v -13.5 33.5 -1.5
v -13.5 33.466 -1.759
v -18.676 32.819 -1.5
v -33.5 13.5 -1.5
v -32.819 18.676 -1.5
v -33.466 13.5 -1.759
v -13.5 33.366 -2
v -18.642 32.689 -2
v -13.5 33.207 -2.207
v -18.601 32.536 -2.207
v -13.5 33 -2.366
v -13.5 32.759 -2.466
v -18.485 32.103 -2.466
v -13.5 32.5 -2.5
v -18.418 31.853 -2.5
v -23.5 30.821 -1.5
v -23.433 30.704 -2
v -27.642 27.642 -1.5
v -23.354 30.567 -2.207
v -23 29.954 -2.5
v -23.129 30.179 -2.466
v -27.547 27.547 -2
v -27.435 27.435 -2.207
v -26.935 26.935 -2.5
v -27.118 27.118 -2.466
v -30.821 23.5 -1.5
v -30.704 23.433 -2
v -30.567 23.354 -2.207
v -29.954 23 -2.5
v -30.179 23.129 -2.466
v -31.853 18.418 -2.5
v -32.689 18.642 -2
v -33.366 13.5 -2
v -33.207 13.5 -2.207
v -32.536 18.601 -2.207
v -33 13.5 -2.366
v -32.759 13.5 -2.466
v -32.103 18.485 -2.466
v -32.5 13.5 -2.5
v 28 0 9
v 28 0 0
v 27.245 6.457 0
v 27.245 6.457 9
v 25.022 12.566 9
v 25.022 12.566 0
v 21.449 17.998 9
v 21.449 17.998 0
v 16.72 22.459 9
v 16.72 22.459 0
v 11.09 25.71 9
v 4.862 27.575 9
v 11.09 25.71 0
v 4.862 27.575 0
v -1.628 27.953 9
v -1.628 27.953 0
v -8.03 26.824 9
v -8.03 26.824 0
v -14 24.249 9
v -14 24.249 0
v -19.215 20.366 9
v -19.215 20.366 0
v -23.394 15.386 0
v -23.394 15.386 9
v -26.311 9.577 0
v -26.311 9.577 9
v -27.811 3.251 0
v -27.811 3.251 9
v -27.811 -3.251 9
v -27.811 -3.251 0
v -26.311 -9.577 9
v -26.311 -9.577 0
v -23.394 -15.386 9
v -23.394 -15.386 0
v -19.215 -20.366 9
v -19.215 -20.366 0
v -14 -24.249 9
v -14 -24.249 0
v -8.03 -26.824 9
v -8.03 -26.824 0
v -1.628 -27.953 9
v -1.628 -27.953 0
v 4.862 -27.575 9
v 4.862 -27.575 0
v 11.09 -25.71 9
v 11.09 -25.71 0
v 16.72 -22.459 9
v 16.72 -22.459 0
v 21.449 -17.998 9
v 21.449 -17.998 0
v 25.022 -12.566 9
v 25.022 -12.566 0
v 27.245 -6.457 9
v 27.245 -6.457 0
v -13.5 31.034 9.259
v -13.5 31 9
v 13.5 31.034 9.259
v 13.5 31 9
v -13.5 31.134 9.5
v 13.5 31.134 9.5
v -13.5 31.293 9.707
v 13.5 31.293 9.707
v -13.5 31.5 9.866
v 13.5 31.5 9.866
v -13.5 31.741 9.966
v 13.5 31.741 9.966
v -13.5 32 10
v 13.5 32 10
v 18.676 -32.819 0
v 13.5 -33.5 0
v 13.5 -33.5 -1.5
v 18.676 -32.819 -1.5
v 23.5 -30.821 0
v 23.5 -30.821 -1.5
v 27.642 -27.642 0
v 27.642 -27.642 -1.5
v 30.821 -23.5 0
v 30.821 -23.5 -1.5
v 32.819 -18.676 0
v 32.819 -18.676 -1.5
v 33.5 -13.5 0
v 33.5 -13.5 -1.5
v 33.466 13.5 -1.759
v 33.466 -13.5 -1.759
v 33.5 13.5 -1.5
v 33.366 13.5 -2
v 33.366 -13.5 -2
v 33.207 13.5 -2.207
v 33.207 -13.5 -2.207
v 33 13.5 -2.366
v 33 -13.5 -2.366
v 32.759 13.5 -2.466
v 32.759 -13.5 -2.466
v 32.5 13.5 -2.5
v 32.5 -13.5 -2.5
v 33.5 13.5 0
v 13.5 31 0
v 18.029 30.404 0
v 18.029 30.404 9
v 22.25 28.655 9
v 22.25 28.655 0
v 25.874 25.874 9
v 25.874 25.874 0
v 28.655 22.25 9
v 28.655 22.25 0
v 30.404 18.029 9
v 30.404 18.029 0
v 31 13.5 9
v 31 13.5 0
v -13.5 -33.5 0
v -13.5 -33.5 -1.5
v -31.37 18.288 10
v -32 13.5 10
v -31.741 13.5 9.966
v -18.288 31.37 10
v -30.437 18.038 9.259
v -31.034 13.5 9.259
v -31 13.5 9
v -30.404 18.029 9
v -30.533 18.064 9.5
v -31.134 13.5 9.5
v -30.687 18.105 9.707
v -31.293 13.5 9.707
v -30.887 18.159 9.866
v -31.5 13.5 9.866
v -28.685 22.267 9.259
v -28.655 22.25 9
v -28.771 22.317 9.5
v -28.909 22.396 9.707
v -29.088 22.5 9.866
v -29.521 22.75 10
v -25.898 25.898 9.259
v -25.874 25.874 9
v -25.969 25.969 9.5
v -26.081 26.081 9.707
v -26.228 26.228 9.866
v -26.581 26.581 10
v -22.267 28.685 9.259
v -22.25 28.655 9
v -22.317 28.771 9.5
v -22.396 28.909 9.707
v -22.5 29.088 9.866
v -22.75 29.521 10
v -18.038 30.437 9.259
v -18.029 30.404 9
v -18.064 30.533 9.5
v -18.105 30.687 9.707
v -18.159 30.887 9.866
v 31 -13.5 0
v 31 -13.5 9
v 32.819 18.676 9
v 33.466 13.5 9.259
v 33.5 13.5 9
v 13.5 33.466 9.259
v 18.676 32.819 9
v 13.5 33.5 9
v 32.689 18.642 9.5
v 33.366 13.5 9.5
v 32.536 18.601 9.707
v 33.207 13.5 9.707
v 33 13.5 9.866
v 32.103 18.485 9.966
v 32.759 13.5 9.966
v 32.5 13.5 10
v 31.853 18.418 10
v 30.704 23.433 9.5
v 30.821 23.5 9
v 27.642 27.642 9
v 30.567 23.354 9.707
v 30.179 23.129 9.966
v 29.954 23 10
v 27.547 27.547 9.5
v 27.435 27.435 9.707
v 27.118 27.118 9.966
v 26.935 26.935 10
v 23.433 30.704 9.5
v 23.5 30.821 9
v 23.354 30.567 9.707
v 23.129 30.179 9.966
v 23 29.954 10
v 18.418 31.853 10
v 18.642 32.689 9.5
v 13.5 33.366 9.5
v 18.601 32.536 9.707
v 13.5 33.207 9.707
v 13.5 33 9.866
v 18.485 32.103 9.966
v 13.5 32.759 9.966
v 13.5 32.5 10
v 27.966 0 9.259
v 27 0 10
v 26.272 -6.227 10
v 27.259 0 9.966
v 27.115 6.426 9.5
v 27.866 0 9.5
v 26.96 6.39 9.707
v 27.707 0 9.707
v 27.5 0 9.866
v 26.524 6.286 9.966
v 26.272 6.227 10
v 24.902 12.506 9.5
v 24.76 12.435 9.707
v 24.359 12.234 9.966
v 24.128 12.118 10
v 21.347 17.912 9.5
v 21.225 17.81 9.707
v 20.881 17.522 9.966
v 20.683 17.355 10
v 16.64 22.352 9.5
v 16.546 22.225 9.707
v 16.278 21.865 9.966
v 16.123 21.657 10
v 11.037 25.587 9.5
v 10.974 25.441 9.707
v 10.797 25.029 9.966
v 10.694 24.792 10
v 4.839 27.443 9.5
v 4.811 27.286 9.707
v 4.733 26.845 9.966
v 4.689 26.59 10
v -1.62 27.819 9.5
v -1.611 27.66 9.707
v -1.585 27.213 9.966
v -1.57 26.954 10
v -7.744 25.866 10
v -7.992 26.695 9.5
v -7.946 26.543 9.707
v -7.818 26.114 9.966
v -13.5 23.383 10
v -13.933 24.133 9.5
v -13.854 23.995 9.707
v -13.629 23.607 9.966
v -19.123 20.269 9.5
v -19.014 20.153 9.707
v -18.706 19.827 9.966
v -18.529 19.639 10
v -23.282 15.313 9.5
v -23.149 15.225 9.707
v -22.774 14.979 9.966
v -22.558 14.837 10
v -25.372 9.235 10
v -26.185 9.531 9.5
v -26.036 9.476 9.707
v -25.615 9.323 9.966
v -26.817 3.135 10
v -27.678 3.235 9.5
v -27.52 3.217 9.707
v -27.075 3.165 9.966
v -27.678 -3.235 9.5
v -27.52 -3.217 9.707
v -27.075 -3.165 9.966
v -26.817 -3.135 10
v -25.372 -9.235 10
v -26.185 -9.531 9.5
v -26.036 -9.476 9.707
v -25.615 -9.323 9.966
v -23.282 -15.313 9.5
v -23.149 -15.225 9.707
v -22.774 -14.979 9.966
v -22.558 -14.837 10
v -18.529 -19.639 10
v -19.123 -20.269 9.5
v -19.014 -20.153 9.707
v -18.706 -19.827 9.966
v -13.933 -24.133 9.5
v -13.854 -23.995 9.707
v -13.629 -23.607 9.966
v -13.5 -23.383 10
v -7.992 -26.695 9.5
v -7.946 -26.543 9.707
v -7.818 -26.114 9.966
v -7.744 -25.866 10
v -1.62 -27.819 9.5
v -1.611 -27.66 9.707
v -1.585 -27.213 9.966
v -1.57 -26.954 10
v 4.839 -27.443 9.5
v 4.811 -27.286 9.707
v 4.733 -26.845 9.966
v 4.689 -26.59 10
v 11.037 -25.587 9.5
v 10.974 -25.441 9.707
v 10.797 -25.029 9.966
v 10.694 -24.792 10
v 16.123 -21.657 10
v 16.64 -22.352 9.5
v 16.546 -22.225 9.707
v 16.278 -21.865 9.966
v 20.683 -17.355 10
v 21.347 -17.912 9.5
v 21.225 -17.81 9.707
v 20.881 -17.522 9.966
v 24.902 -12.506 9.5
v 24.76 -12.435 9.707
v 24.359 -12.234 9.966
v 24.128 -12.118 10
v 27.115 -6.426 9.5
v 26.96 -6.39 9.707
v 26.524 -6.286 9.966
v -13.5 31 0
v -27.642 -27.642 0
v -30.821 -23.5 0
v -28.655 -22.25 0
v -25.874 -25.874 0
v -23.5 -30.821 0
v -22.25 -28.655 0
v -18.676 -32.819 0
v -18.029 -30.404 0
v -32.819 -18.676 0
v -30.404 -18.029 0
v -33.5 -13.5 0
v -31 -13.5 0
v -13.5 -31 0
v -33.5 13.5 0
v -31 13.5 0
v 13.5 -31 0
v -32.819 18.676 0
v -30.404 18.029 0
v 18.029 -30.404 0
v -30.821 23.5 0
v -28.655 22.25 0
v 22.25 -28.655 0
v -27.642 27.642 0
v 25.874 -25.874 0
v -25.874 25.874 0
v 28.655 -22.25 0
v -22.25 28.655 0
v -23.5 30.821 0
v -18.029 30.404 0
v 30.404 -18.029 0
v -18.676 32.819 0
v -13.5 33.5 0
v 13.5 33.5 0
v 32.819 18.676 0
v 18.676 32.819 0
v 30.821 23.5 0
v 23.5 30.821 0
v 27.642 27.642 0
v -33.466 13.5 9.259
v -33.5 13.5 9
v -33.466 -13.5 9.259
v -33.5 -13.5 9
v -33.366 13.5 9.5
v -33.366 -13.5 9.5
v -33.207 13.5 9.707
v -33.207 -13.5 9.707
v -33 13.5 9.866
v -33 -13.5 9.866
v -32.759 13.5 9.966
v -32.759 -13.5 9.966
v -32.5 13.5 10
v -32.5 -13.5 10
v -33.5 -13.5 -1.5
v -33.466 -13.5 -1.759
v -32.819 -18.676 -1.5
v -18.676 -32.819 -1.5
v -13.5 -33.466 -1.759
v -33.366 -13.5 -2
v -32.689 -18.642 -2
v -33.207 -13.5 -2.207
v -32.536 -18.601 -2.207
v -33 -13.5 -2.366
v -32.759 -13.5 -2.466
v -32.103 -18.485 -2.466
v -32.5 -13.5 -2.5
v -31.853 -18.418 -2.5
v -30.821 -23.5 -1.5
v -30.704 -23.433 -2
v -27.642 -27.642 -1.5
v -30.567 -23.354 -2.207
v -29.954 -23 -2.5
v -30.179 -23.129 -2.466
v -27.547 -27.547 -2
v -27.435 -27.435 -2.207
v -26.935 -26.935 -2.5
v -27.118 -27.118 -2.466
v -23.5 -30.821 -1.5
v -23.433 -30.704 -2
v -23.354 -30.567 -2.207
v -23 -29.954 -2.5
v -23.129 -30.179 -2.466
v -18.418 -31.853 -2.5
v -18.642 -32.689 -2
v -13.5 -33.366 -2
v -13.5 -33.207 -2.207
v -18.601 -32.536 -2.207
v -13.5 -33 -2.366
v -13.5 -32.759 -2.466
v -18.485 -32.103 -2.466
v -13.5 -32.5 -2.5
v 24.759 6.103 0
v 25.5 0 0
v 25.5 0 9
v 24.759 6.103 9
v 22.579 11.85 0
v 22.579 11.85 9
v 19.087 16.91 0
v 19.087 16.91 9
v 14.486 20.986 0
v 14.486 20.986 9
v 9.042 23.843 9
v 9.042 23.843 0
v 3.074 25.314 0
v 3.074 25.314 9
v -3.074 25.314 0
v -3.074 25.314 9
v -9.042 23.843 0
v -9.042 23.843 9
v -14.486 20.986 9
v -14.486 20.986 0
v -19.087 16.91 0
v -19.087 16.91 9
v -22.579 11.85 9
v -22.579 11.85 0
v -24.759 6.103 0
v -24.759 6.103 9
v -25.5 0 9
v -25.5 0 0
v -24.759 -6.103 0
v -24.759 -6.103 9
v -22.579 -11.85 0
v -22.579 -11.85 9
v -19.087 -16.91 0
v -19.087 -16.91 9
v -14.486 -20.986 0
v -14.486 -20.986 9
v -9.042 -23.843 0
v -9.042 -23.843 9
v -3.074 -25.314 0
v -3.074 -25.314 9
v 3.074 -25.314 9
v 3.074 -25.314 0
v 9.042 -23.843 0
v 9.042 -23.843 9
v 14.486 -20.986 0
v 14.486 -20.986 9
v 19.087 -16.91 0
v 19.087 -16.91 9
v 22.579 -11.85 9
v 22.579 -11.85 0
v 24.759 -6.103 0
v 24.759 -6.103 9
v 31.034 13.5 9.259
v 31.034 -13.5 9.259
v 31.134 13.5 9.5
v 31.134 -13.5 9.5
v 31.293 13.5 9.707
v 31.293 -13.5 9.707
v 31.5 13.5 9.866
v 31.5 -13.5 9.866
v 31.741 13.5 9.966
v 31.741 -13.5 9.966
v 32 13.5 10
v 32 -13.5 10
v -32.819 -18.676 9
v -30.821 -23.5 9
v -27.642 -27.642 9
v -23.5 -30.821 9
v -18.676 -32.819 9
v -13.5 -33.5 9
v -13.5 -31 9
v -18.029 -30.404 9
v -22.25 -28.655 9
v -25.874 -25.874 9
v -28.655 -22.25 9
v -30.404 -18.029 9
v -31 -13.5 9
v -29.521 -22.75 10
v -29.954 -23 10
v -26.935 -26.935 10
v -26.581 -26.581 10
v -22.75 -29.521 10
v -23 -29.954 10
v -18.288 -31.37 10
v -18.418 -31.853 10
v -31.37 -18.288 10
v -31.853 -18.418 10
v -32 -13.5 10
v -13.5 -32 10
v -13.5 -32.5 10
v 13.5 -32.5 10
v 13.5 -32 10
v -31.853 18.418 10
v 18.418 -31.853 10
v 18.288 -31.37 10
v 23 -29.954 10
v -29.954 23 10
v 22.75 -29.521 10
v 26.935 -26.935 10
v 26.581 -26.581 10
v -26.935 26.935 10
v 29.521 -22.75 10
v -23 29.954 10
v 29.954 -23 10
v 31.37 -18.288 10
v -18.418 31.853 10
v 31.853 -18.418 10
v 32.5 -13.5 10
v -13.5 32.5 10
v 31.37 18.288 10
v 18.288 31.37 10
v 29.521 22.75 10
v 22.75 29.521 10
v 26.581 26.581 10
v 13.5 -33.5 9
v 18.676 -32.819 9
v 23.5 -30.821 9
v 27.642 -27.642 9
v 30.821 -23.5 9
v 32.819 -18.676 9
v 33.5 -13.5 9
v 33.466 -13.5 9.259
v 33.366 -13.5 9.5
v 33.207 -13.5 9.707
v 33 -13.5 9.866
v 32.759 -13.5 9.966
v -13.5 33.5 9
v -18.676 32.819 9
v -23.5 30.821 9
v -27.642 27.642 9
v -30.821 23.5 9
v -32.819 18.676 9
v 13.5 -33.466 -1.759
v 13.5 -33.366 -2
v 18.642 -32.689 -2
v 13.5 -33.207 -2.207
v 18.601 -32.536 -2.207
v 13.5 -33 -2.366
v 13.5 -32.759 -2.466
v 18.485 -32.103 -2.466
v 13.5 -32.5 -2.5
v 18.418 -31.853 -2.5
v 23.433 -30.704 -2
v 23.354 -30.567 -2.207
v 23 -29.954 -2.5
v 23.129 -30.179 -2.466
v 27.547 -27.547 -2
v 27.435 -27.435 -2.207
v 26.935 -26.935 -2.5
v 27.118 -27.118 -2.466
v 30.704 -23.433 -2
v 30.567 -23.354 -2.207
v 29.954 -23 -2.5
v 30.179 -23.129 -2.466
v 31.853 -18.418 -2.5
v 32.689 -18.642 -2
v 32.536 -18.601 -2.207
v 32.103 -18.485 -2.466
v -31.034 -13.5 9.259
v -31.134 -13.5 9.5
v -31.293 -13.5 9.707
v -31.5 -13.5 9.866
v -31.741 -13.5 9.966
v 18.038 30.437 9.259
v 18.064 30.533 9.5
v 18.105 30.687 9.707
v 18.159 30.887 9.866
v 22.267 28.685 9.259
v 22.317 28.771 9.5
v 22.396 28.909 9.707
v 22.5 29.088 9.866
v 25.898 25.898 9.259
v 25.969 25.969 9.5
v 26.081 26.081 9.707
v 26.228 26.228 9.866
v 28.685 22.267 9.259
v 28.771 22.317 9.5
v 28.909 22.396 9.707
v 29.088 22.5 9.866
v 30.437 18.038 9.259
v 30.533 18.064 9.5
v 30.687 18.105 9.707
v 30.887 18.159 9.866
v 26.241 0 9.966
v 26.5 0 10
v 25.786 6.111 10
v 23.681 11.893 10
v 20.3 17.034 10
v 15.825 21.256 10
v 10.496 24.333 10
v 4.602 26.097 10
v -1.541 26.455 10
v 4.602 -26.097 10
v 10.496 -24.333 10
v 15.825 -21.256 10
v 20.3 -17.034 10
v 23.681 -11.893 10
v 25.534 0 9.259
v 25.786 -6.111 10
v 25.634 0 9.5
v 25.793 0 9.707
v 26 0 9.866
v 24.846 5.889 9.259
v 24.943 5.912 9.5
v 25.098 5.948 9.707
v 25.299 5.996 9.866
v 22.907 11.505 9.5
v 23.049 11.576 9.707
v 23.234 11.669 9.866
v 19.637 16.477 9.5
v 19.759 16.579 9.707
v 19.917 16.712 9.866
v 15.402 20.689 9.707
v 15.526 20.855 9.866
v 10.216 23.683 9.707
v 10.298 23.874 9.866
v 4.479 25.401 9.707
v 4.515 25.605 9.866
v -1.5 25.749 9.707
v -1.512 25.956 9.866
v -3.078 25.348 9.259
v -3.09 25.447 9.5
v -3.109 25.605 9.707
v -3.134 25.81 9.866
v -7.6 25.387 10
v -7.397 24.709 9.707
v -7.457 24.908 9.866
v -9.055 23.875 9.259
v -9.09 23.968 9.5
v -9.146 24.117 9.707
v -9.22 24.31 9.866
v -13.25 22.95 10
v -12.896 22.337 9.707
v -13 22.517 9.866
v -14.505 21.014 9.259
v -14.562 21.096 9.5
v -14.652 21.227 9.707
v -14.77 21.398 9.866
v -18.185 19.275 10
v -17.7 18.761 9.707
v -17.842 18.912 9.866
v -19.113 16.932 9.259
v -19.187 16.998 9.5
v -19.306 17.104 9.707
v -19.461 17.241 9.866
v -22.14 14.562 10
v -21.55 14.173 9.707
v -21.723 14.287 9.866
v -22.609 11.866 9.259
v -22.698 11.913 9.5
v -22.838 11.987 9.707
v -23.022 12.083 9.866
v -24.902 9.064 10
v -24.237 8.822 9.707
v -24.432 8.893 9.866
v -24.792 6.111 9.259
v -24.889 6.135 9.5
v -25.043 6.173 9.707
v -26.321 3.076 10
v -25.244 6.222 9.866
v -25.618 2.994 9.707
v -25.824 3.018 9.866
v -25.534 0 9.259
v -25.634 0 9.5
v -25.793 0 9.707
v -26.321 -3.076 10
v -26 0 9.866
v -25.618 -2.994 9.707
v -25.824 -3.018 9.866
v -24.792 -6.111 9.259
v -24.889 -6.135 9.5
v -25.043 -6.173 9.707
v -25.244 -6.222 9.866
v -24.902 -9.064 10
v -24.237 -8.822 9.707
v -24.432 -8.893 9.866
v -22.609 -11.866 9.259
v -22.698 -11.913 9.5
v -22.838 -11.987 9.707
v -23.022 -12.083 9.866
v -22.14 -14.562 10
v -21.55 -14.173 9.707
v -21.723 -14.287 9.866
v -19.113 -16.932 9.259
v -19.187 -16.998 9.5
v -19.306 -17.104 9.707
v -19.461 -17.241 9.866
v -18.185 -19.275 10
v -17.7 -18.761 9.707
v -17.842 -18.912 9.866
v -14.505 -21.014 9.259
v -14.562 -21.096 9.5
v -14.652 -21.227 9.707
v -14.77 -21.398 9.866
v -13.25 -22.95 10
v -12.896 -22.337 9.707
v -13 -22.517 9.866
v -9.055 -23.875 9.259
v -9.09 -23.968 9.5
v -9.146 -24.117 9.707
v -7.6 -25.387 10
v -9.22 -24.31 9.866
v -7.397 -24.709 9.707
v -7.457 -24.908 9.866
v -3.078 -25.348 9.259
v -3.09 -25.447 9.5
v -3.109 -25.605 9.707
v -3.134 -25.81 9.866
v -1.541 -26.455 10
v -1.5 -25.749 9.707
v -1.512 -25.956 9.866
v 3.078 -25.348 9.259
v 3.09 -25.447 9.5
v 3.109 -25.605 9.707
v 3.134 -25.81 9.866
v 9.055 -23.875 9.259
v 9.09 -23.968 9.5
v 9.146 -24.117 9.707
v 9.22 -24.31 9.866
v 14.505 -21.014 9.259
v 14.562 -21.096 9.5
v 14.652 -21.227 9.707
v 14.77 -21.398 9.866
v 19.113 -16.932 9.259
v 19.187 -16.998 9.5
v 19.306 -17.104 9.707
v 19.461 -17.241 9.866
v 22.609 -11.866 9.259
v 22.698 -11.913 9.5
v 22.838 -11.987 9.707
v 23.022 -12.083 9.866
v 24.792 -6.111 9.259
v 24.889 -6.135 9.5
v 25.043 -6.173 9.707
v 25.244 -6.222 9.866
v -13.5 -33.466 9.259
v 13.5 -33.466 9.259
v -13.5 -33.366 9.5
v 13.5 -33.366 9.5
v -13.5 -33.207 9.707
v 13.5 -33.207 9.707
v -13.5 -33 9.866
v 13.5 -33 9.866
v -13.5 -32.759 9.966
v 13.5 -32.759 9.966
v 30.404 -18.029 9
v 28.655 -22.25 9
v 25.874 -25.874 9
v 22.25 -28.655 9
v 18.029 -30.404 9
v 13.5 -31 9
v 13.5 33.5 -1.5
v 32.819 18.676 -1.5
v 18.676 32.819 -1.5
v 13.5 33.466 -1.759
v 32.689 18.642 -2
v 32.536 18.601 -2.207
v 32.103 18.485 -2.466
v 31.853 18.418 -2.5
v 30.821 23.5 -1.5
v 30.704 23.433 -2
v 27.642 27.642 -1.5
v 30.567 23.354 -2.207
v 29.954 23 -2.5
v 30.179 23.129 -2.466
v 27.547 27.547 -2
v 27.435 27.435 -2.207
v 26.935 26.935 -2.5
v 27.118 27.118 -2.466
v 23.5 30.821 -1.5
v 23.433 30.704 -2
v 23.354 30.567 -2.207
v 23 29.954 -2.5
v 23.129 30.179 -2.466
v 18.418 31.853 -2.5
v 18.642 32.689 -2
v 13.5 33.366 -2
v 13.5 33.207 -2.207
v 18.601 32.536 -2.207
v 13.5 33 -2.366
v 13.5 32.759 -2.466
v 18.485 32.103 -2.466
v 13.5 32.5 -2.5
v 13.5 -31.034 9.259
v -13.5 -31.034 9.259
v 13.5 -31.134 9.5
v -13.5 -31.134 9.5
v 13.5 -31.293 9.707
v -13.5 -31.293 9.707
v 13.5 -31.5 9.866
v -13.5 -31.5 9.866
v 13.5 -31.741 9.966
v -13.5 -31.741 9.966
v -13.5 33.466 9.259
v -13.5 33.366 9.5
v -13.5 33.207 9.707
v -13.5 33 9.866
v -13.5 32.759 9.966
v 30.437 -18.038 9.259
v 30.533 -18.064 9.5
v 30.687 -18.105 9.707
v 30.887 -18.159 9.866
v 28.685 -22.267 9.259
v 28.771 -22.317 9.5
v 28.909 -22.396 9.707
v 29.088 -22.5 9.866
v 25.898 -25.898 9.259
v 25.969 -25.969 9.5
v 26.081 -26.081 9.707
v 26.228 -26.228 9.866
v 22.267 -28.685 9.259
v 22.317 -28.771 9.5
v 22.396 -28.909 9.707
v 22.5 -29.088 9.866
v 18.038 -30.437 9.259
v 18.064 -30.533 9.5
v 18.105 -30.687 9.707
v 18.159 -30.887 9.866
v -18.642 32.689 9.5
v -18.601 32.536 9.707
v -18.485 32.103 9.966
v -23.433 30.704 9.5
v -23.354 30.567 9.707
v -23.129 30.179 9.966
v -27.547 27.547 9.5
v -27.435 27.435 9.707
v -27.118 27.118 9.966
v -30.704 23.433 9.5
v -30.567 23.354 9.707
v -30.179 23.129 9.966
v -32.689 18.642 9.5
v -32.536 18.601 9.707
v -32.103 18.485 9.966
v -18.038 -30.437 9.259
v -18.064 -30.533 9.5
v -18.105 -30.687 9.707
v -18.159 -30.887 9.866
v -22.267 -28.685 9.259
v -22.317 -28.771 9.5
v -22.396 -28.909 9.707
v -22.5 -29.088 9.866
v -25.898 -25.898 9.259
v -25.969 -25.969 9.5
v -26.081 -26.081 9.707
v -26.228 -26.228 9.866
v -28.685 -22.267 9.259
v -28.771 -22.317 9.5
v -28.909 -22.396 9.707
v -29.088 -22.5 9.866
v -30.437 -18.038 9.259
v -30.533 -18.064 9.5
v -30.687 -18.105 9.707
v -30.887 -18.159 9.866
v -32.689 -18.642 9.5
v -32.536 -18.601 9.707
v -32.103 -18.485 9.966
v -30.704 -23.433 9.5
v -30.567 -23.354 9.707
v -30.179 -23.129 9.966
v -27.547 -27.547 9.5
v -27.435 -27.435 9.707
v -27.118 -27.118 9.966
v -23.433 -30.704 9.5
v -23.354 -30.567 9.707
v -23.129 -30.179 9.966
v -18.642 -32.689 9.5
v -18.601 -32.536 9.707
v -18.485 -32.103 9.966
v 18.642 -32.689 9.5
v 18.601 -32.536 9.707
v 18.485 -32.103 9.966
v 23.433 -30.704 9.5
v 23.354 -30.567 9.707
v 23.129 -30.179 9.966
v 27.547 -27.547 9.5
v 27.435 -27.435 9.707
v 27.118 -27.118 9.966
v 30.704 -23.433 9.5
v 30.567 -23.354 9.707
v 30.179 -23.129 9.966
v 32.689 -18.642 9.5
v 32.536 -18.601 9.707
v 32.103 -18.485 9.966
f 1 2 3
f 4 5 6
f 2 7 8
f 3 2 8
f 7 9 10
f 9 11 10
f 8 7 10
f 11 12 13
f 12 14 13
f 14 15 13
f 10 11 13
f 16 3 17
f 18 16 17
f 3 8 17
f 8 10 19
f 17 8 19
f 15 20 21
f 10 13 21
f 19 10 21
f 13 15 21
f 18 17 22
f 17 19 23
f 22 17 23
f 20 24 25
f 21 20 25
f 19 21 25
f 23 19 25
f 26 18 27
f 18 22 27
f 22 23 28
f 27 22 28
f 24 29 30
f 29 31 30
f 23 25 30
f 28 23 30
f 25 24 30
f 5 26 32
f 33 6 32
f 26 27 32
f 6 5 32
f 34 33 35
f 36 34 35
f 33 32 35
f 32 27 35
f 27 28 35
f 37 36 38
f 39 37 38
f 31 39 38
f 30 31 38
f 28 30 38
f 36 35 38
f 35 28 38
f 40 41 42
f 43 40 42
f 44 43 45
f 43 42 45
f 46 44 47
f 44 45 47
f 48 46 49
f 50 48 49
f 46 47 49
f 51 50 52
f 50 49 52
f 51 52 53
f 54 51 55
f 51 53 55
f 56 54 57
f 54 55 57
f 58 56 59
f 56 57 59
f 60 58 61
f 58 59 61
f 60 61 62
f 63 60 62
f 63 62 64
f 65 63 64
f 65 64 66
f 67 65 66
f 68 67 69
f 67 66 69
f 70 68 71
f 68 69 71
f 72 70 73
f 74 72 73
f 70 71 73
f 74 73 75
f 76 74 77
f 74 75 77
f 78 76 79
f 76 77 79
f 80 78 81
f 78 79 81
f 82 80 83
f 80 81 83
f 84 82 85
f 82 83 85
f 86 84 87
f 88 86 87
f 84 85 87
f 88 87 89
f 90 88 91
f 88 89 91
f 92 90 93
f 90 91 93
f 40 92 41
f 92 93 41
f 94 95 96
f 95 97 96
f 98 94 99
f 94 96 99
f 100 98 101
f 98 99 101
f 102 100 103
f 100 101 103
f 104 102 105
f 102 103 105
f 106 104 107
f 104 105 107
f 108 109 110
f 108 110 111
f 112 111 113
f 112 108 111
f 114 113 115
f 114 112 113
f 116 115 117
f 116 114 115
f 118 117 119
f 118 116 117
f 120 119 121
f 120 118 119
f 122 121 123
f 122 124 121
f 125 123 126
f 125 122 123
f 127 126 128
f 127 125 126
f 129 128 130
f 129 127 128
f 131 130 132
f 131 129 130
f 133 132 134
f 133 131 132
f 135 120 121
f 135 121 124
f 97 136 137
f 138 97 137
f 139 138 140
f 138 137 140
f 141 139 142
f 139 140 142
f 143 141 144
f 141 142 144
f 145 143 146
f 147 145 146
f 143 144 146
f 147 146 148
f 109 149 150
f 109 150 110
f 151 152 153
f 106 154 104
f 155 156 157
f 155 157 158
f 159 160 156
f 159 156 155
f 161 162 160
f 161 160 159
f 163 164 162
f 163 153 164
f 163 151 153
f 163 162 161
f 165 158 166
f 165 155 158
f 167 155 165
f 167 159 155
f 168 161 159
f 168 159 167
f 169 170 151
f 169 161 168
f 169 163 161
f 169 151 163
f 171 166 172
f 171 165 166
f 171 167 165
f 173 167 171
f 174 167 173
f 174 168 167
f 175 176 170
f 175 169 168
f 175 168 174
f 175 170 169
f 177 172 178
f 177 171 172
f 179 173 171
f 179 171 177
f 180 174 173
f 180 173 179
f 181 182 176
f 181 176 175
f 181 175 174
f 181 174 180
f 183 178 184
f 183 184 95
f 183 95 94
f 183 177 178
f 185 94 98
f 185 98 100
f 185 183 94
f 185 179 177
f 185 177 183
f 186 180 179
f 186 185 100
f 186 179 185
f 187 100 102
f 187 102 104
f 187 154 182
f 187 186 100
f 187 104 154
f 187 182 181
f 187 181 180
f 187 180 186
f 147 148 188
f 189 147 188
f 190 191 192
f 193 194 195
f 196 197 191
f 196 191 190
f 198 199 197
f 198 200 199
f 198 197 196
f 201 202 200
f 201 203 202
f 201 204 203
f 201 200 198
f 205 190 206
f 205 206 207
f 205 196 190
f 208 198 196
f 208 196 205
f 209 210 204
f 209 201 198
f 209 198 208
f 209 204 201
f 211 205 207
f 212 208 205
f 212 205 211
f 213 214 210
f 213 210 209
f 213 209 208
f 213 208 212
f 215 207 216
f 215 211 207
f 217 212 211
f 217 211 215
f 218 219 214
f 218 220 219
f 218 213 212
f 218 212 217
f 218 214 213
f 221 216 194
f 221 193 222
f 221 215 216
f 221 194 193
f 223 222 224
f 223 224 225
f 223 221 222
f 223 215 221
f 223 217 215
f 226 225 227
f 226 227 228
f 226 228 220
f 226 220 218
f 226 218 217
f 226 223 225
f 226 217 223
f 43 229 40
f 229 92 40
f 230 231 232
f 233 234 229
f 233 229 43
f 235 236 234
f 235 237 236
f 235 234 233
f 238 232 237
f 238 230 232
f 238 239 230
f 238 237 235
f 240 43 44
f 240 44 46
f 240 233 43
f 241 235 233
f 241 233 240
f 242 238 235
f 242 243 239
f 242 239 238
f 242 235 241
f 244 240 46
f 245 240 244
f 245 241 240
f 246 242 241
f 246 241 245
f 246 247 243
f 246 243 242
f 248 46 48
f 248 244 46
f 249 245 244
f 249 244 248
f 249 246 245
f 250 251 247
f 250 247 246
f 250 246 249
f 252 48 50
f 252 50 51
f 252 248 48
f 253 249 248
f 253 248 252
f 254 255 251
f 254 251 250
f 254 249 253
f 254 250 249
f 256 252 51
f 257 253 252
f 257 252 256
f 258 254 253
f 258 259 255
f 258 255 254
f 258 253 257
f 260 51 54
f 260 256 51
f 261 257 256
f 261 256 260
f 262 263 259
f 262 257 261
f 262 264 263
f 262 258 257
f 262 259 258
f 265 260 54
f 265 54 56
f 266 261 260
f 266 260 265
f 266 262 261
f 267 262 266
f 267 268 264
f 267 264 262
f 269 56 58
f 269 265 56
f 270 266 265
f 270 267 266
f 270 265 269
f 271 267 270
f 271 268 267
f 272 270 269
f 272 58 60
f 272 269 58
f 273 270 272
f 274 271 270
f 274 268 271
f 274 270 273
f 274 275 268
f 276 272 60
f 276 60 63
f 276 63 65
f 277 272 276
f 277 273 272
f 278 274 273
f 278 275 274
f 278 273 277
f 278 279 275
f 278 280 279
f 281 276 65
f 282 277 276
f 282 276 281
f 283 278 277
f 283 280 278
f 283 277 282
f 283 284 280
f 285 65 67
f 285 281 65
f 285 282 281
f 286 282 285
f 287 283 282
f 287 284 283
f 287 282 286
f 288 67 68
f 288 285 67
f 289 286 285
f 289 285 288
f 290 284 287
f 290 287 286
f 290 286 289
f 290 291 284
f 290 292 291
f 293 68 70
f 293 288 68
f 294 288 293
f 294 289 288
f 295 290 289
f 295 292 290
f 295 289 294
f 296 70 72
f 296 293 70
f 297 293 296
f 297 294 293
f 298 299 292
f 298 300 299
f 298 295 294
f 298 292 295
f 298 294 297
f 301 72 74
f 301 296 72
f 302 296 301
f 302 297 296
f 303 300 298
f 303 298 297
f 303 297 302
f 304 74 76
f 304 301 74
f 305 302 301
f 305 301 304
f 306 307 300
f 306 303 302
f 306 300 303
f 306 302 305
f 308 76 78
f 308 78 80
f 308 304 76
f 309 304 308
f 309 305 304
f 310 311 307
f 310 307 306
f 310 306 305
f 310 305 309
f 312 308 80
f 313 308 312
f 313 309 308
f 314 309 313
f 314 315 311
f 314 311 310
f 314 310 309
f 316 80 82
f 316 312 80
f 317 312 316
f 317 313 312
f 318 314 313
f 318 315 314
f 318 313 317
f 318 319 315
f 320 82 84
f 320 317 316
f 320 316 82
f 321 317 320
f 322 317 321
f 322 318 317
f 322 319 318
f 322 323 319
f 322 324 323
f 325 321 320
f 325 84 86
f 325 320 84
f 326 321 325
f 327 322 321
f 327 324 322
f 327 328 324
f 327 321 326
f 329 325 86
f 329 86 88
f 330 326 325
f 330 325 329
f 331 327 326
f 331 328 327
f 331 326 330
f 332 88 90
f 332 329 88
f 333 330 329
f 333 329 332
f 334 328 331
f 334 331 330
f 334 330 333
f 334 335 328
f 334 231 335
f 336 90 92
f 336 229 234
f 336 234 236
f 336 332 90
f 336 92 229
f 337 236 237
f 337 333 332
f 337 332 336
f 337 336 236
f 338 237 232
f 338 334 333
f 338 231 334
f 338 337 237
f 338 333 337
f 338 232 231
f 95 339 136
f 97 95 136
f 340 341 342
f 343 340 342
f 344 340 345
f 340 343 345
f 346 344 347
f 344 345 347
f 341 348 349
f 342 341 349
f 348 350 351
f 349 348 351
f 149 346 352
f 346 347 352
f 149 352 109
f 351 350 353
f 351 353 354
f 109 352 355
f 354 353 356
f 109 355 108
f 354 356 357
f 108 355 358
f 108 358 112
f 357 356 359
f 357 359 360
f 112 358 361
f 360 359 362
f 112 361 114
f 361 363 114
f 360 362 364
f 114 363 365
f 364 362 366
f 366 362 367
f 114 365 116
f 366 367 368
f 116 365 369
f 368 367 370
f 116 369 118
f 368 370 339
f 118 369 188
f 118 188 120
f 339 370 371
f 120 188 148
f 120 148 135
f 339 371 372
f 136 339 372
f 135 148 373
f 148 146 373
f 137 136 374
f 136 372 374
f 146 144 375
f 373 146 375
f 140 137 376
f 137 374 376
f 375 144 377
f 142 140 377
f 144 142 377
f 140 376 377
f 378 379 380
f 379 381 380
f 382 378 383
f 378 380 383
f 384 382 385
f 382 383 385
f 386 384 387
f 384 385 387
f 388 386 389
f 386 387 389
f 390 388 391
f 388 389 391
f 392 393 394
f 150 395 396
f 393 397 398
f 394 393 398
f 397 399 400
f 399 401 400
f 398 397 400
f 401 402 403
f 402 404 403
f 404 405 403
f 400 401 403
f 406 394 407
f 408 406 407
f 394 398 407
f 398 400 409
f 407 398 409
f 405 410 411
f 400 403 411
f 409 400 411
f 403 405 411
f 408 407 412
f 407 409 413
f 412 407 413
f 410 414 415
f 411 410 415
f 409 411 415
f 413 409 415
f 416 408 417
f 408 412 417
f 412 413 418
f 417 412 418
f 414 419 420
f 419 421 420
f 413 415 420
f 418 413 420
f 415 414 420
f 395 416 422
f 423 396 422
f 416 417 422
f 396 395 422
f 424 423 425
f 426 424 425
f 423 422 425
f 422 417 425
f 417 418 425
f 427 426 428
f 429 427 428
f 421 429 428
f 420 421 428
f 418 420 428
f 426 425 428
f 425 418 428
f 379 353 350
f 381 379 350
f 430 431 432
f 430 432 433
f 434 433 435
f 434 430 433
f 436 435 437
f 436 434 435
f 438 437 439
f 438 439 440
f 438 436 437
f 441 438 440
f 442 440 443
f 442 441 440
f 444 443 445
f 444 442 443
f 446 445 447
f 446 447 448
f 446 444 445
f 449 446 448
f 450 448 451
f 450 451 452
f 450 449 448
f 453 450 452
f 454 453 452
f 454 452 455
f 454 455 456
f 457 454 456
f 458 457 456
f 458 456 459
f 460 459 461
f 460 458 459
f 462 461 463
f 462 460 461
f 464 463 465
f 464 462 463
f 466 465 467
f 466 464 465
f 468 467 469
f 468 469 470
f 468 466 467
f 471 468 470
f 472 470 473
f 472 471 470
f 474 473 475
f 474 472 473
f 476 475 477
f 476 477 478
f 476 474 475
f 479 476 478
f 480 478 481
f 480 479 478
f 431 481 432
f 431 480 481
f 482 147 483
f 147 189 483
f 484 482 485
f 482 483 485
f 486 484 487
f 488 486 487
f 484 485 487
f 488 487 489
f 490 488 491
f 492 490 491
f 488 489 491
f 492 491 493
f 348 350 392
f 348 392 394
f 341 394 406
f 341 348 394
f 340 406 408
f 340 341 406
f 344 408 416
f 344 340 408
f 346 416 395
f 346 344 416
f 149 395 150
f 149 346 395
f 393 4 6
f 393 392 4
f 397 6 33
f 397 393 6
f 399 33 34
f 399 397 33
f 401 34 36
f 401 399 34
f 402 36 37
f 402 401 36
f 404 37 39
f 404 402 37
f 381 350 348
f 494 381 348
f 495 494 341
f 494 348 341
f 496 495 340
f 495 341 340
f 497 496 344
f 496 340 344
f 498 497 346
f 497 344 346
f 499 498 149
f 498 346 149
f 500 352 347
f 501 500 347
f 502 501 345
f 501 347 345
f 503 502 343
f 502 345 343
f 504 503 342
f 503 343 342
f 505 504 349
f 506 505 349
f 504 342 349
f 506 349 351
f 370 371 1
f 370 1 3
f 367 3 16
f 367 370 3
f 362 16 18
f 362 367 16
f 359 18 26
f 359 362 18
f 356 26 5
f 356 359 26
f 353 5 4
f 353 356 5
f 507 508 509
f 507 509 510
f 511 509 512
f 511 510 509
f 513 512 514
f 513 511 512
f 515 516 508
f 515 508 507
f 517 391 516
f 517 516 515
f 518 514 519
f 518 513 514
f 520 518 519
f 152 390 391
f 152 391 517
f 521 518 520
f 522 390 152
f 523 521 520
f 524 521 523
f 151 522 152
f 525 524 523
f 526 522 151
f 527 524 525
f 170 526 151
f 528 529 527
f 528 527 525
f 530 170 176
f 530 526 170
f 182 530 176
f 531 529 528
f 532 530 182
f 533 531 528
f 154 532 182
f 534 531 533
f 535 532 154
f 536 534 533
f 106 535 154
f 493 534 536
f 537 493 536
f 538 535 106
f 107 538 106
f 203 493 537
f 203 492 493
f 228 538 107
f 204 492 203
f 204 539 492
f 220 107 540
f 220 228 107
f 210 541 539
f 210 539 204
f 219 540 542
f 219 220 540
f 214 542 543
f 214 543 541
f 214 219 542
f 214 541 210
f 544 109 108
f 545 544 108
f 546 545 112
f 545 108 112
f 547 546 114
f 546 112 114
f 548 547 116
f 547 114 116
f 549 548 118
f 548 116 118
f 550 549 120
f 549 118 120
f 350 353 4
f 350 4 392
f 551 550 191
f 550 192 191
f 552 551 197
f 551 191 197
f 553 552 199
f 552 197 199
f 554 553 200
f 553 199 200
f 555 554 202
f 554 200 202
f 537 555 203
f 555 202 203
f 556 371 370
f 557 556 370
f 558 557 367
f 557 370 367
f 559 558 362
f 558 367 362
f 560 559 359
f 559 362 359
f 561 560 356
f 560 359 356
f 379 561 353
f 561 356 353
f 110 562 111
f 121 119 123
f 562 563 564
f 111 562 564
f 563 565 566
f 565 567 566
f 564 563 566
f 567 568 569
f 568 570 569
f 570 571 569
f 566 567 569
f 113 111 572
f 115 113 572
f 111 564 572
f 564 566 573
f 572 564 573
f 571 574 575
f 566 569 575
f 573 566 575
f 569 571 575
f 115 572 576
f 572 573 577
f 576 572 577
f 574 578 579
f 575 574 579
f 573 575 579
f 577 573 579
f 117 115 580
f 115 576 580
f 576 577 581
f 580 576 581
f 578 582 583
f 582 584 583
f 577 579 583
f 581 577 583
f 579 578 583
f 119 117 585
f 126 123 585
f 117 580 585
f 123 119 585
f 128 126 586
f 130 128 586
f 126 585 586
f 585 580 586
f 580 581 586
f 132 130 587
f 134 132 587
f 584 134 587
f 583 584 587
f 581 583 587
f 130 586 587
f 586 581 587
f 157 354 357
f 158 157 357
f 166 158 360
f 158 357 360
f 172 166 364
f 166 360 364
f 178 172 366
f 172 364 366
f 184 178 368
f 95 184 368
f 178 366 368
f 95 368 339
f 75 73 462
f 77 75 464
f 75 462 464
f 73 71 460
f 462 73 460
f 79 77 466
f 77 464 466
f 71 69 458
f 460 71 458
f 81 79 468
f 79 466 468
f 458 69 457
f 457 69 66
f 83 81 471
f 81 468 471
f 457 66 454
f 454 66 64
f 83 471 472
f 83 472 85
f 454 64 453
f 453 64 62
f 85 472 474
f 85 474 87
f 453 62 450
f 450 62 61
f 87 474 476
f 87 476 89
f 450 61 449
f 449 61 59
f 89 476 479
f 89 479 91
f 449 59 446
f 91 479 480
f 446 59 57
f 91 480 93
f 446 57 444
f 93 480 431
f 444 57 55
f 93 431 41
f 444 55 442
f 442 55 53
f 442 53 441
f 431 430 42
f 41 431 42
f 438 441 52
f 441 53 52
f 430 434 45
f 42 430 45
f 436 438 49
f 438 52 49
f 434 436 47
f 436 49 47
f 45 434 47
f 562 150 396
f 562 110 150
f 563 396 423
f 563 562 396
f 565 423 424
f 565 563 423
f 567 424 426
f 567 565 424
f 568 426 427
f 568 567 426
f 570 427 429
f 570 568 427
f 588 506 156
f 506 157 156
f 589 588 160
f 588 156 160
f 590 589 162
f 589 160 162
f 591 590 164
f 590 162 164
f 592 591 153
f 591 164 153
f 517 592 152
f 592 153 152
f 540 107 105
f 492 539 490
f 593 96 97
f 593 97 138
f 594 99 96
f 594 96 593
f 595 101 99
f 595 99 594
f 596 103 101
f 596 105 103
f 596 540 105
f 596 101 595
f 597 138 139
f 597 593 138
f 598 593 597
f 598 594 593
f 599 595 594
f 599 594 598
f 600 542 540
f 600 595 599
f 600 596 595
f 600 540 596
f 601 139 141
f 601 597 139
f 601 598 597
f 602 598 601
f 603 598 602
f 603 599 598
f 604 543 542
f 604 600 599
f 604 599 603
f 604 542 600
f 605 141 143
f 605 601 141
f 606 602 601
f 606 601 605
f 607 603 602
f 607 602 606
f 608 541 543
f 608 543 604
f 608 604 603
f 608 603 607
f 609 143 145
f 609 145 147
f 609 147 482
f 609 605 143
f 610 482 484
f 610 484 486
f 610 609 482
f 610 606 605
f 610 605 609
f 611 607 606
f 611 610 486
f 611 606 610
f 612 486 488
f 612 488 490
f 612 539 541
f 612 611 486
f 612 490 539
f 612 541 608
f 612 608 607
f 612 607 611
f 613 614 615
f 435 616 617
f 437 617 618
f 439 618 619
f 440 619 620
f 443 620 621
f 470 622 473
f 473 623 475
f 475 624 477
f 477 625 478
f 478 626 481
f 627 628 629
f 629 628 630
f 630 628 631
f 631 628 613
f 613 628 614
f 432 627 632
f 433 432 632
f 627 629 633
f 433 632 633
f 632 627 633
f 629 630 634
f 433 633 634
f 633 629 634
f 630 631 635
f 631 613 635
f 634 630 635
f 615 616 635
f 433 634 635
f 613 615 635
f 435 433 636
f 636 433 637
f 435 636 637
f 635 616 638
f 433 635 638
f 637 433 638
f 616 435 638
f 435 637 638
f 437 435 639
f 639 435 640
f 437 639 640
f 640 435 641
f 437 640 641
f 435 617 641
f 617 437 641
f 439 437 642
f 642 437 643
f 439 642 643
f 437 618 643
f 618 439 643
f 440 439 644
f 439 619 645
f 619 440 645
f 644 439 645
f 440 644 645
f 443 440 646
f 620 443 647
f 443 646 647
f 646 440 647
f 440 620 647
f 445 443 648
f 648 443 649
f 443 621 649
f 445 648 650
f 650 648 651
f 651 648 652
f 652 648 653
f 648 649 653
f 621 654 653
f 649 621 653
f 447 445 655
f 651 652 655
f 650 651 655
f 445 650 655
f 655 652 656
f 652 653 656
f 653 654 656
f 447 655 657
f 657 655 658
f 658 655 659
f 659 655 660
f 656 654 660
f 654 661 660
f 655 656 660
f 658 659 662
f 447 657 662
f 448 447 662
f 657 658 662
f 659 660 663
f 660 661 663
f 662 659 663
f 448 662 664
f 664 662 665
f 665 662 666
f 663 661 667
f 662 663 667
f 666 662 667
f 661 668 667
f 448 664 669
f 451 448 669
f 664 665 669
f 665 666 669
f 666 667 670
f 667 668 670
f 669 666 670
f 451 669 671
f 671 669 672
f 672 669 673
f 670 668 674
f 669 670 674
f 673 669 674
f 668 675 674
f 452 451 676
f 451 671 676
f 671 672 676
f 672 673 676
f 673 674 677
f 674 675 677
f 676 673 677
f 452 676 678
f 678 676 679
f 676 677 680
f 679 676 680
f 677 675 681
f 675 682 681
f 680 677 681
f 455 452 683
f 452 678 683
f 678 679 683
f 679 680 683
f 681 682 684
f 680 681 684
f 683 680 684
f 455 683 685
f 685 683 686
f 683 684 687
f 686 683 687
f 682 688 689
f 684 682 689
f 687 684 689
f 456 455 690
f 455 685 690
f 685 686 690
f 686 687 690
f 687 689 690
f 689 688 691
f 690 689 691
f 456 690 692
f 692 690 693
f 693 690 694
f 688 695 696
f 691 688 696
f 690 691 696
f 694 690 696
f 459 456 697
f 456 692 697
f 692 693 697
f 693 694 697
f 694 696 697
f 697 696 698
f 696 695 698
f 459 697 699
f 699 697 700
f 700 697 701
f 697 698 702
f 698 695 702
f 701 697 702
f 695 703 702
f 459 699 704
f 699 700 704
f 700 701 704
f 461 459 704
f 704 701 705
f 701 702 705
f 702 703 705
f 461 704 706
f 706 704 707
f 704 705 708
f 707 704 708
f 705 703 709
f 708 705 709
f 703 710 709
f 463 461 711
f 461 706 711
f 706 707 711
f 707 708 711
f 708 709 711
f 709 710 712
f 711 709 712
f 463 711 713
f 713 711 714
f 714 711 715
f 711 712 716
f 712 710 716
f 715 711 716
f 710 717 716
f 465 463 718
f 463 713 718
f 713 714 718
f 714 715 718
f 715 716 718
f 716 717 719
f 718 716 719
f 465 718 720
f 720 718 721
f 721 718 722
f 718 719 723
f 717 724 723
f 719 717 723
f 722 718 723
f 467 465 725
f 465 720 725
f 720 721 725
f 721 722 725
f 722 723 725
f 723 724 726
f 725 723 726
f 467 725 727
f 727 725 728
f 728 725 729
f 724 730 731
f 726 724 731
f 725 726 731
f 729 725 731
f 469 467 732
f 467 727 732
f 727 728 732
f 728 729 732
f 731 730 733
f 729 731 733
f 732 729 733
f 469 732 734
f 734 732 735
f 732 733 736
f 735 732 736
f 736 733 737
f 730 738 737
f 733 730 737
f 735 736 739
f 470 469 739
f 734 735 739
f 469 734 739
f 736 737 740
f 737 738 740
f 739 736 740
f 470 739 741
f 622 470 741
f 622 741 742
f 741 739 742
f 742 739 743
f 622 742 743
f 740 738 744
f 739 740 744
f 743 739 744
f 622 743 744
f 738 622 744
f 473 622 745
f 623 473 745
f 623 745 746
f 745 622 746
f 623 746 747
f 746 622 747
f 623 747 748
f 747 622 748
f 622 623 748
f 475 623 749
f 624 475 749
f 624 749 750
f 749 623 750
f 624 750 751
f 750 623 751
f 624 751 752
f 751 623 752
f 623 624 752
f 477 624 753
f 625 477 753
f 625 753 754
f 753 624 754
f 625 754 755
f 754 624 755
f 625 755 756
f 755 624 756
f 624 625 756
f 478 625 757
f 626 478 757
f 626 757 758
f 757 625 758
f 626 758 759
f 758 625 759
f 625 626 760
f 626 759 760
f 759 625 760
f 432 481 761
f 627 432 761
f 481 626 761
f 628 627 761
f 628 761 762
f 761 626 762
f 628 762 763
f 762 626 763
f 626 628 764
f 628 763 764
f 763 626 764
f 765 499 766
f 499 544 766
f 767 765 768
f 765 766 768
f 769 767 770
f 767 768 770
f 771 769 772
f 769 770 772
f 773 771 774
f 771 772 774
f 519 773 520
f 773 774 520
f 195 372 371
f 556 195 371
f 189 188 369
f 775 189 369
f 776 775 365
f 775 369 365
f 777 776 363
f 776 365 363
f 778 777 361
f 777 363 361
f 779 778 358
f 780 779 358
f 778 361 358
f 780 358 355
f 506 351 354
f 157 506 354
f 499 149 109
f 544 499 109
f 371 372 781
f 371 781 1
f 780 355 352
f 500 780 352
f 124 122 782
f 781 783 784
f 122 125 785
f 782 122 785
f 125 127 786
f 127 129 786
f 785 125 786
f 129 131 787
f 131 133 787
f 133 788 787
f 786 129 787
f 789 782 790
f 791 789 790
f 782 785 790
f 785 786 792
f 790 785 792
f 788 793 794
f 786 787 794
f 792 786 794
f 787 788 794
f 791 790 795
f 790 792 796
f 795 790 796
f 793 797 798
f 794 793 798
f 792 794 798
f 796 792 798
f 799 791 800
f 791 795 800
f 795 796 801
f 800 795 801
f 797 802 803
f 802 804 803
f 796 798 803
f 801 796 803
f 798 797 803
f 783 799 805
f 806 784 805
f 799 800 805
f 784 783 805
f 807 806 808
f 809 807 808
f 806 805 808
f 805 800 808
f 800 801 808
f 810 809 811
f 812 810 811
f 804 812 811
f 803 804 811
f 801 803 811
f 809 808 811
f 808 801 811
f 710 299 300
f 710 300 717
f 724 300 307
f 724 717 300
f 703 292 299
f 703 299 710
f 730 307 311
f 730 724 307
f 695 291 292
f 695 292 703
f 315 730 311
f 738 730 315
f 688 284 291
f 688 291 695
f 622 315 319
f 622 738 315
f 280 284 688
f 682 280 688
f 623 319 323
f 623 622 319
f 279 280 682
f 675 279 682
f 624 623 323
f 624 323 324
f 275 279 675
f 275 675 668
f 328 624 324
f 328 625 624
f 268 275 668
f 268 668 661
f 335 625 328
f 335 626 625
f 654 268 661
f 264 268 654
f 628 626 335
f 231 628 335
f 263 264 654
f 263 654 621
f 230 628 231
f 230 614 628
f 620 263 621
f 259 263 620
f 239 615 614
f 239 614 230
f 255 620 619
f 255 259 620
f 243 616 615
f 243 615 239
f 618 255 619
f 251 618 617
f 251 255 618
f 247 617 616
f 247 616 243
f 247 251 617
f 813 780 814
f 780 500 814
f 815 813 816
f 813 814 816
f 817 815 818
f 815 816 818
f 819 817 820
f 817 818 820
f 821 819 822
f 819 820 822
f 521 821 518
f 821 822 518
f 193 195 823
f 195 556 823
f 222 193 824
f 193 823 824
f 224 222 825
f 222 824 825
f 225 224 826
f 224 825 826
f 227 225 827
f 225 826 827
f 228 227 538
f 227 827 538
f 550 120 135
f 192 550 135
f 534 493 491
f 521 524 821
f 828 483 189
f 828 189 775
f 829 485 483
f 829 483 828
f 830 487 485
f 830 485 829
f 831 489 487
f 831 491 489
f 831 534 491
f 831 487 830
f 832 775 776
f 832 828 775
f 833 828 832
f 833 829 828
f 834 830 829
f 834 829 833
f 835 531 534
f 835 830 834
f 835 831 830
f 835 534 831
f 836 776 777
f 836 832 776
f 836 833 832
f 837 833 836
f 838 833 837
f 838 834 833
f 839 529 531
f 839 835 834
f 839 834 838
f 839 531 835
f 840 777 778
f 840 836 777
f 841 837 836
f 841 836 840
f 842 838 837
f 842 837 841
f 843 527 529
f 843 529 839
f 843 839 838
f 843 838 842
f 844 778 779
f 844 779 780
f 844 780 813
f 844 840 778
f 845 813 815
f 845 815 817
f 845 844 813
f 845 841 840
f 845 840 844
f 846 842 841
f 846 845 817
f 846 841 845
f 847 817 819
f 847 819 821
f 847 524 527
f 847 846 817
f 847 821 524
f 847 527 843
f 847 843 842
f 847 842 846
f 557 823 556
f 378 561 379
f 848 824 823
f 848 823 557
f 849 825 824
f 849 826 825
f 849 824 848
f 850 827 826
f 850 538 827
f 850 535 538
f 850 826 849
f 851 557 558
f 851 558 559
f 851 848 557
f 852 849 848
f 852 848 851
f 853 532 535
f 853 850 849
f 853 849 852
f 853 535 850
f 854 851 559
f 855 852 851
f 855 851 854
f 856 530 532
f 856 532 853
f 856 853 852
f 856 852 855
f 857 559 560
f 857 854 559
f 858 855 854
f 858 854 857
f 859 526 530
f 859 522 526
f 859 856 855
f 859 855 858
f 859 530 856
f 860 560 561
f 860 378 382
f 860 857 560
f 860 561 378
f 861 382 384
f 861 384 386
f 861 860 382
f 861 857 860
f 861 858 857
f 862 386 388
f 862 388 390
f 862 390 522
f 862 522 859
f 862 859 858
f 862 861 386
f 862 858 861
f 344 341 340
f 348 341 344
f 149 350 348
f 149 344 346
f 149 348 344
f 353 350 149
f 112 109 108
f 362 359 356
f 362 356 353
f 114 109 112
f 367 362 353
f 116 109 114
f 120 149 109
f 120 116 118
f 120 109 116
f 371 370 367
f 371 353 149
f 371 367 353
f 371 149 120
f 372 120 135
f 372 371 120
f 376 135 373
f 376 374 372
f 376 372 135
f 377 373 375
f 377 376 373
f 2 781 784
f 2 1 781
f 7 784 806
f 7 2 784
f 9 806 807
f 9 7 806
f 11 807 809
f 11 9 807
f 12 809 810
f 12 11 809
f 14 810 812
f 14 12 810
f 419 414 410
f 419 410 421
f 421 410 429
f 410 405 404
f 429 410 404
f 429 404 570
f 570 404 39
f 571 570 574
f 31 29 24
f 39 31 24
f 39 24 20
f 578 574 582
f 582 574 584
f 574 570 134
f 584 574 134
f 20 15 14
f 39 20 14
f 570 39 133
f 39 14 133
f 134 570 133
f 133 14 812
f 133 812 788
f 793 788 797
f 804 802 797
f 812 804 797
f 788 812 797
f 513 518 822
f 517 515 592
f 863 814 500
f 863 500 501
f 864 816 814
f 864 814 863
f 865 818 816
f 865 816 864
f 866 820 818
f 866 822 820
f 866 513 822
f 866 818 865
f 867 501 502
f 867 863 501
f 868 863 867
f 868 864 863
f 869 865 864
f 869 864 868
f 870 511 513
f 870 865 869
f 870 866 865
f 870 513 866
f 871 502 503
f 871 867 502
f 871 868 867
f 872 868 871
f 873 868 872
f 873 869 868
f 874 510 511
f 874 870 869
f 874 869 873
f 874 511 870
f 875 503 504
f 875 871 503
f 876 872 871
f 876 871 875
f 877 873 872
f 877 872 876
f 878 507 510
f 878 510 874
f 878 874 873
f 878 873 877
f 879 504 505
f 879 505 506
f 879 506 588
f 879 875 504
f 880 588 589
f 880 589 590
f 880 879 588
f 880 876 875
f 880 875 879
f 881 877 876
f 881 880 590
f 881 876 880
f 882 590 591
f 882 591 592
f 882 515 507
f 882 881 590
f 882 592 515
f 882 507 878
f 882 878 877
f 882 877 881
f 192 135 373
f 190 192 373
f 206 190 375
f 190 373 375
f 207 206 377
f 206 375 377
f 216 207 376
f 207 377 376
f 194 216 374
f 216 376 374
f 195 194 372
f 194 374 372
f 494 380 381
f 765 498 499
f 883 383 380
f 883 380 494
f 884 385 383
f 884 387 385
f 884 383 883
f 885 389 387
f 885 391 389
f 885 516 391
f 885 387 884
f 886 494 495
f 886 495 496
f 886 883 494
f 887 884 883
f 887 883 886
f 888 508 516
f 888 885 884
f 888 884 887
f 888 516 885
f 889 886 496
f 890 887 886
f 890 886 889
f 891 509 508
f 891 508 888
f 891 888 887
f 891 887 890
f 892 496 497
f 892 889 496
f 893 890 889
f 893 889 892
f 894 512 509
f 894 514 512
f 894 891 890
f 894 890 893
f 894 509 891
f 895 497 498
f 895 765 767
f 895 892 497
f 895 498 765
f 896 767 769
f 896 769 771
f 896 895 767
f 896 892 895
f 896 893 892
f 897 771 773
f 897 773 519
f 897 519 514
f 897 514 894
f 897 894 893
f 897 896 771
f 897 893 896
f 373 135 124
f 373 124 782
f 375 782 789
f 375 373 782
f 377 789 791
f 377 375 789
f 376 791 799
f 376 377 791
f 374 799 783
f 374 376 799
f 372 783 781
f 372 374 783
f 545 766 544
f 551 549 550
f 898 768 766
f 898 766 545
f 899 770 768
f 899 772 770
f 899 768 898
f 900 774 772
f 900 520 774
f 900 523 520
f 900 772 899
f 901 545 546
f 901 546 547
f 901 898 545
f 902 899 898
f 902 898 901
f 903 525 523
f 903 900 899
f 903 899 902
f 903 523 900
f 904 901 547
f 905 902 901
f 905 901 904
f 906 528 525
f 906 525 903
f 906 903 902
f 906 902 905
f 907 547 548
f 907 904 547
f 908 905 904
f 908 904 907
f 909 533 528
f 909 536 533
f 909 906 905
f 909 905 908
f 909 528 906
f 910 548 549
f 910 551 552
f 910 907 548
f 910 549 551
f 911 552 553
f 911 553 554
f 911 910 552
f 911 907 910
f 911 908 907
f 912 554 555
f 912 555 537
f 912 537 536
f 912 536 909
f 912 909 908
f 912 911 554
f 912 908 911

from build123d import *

# Parameters (mm, degrees)
F0_R     = 28
F0_R_2   = 25.5
F1_DEPTH = 2.5
F2_DEPTH = 10
F3_R     = 1
F4_R     = 1
F4_2_R   = 1


with BuildPart() as f1:
    # F0 (on Top) → F1 (new body)
    with BuildSketch(Plane.XY):
        with BuildLine():
            Line((-13.5, -33.5), (13.5, -33.5))
            ThreePointArc((13.5, -33.5), (27.6421356237, -27.6421356237), (33.5, -13.5))
            Line((33.5, -13.5), (33.5, 13.5))
            ThreePointArc((33.5, 13.5), (27.6421356237, 27.6421356237), (13.5, 33.5))
            Line((13.5, 33.5), (-13.5, 33.5))
            ThreePointArc((-13.5, 33.5), (-27.6421356237, 27.6421356237), (-33.5, 13.5))
            Line((-33.5, 13.5), (-33.5, -13.5))
            ThreePointArc((-33.5, -13.5), (-27.6421356237, -27.6421356237), (-13.5, -33.5))
        make_face()
        with BuildLine():
            ThreePointArc((31, -13.5), (25.8743686708, -25.8743686708), (13.5, -31))
            Line((13.5, -31), (-13.5, -31))
            ThreePointArc((-13.5, -31), (-25.8743686708, -25.8743686708), (-31, -13.5))
            Line((-31, -13.5), (-31, 13.5))
            ThreePointArc((-31, 13.5), (-25.8743686708, 25.8743686708), (-13.5, 31))
            Line((-13.5, 31), (13.5, 31))
            ThreePointArc((13.5, 31), (25.8743686708, 25.8743686708), (31, 13.5))
            Line((31, 13.5), (31, -13.5))
        make_face(mode=Mode.SUBTRACT)
        with BuildLine():
            Line((-13.5, -31), (13.5, -31))
            ThreePointArc((13.5, -31), (25.8743686708, -25.8743686708), (31, -13.5))
            Line((31, -13.5), (31, 13.5))
            ThreePointArc((31, 13.5), (25.8743686708, 25.8743686708), (13.5, 31))
            Line((13.5, 31), (-13.5, 31))
            ThreePointArc((-13.5, 31), (-25.8743686708, 25.8743686708), (-31, 13.5))
            Line((-31, 13.5), (-31, -13.5))
            ThreePointArc((-31, -13.5), (-25.8743686708, -25.8743686708), (-13.5, -31))
        make_face()
        Circle(F0_R, mode=Mode.SUBTRACT)
        Circle(F0_R)
        Circle(F0_R_2, mode=Mode.SUBTRACT)
        Circle(F0_R_2)
    extrude(amount=-F1_DEPTH)

    # F4#2
    f4_2_edges = [f1.edges().sort_by_distance(p)[0] for p in [
        (-33.5, 0, -2.5),
        (-27.642136, -27.642136, -2.5),
        (0, -33.5, -2.5),
        (27.642136, -27.642136, -2.5),
        (33.5, 0, -2.5),
        (27.642136, 27.642136, -2.5),
        (0, 33.5, -2.5),
        (-27.642136, 27.642136, -2.5),
    ]]
    fillet(f4_2_edges, radius=F4_2_R)


with BuildPart() as f2:
    # F0 (on Top) → F2 (new body)
    with BuildSketch(Plane.XY):
        Circle(F0_R)
        Circle(F0_R_2, mode=Mode.SUBTRACT)
    extrude(amount=F2_DEPTH)

    # F3
    f3_edges = [f2.edges().sort_by_distance(p)[0] for p in [
        (-25.5, 0, 10),
        (-28, 0, 10),
    ]]
    fillet(f3_edges, radius=F3_R)


with BuildPart() as f2b:
    # F0 (on Top) → F2, piece 2 (new body)
    with BuildSketch(Plane.XY):
        with BuildLine():
            Line((-13.5, -33.5), (13.5, -33.5))
            ThreePointArc((13.5, -33.5), (27.6421356237, -27.6421356237), (33.5, -13.5))
            Line((33.5, -13.5), (33.5, 13.5))
            ThreePointArc((33.5, 13.5), (27.6421356237, 27.6421356237), (13.5, 33.5))
            Line((13.5, 33.5), (-13.5, 33.5))
            ThreePointArc((-13.5, 33.5), (-27.6421356237, 27.6421356237), (-33.5, 13.5))
            Line((-33.5, 13.5), (-33.5, -13.5))
            ThreePointArc((-33.5, -13.5), (-27.6421356237, -27.6421356237), (-13.5, -33.5))
        make_face()
        with BuildLine():
            ThreePointArc((31, -13.5), (25.8743686708, -25.8743686708), (13.5, -31))
            Line((13.5, -31), (-13.5, -31))
            ThreePointArc((-13.5, -31), (-25.8743686708, -25.8743686708), (-31, -13.5))
            Line((-31, -13.5), (-31, 13.5))
            ThreePointArc((-31, 13.5), (-25.8743686708, 25.8743686708), (-13.5, 31))
            Line((-13.5, 31), (13.5, 31))
            ThreePointArc((13.5, 31), (25.8743686708, 25.8743686708), (31, 13.5))
            Line((31, 13.5), (31, -13.5))
        make_face(mode=Mode.SUBTRACT)
    extrude(amount=F2_DEPTH)

    # F4
    f4_edges = [f2b.edges().sort_by_distance(p)[0] for p in [
        (-33.5, 0, 10),
        (-27.642136, -27.642136, 10),
        (0, -33.5, 10),
        (27.642136, -27.642136, 10),
        (33.5, 0, 10),
        (27.642136, 27.642136, 10),
        (0, 33.5, 10),
        (-27.642136, 27.642136, 10),
        (25.874369, -25.874369, 10),
        (0, -31, 10),
        (-25.874369, -25.874369, 10),
        (-31, 0, 10),
        (-25.874369, 25.874369, 10),
        (0, 31, 10),
        (25.874369, 25.874369, 10),
        (31, 0, 10),
    ]]
    fillet(f4_edges, radius=F4_R)


solid = Compound([f1.part, f2.part, f2b.part])
